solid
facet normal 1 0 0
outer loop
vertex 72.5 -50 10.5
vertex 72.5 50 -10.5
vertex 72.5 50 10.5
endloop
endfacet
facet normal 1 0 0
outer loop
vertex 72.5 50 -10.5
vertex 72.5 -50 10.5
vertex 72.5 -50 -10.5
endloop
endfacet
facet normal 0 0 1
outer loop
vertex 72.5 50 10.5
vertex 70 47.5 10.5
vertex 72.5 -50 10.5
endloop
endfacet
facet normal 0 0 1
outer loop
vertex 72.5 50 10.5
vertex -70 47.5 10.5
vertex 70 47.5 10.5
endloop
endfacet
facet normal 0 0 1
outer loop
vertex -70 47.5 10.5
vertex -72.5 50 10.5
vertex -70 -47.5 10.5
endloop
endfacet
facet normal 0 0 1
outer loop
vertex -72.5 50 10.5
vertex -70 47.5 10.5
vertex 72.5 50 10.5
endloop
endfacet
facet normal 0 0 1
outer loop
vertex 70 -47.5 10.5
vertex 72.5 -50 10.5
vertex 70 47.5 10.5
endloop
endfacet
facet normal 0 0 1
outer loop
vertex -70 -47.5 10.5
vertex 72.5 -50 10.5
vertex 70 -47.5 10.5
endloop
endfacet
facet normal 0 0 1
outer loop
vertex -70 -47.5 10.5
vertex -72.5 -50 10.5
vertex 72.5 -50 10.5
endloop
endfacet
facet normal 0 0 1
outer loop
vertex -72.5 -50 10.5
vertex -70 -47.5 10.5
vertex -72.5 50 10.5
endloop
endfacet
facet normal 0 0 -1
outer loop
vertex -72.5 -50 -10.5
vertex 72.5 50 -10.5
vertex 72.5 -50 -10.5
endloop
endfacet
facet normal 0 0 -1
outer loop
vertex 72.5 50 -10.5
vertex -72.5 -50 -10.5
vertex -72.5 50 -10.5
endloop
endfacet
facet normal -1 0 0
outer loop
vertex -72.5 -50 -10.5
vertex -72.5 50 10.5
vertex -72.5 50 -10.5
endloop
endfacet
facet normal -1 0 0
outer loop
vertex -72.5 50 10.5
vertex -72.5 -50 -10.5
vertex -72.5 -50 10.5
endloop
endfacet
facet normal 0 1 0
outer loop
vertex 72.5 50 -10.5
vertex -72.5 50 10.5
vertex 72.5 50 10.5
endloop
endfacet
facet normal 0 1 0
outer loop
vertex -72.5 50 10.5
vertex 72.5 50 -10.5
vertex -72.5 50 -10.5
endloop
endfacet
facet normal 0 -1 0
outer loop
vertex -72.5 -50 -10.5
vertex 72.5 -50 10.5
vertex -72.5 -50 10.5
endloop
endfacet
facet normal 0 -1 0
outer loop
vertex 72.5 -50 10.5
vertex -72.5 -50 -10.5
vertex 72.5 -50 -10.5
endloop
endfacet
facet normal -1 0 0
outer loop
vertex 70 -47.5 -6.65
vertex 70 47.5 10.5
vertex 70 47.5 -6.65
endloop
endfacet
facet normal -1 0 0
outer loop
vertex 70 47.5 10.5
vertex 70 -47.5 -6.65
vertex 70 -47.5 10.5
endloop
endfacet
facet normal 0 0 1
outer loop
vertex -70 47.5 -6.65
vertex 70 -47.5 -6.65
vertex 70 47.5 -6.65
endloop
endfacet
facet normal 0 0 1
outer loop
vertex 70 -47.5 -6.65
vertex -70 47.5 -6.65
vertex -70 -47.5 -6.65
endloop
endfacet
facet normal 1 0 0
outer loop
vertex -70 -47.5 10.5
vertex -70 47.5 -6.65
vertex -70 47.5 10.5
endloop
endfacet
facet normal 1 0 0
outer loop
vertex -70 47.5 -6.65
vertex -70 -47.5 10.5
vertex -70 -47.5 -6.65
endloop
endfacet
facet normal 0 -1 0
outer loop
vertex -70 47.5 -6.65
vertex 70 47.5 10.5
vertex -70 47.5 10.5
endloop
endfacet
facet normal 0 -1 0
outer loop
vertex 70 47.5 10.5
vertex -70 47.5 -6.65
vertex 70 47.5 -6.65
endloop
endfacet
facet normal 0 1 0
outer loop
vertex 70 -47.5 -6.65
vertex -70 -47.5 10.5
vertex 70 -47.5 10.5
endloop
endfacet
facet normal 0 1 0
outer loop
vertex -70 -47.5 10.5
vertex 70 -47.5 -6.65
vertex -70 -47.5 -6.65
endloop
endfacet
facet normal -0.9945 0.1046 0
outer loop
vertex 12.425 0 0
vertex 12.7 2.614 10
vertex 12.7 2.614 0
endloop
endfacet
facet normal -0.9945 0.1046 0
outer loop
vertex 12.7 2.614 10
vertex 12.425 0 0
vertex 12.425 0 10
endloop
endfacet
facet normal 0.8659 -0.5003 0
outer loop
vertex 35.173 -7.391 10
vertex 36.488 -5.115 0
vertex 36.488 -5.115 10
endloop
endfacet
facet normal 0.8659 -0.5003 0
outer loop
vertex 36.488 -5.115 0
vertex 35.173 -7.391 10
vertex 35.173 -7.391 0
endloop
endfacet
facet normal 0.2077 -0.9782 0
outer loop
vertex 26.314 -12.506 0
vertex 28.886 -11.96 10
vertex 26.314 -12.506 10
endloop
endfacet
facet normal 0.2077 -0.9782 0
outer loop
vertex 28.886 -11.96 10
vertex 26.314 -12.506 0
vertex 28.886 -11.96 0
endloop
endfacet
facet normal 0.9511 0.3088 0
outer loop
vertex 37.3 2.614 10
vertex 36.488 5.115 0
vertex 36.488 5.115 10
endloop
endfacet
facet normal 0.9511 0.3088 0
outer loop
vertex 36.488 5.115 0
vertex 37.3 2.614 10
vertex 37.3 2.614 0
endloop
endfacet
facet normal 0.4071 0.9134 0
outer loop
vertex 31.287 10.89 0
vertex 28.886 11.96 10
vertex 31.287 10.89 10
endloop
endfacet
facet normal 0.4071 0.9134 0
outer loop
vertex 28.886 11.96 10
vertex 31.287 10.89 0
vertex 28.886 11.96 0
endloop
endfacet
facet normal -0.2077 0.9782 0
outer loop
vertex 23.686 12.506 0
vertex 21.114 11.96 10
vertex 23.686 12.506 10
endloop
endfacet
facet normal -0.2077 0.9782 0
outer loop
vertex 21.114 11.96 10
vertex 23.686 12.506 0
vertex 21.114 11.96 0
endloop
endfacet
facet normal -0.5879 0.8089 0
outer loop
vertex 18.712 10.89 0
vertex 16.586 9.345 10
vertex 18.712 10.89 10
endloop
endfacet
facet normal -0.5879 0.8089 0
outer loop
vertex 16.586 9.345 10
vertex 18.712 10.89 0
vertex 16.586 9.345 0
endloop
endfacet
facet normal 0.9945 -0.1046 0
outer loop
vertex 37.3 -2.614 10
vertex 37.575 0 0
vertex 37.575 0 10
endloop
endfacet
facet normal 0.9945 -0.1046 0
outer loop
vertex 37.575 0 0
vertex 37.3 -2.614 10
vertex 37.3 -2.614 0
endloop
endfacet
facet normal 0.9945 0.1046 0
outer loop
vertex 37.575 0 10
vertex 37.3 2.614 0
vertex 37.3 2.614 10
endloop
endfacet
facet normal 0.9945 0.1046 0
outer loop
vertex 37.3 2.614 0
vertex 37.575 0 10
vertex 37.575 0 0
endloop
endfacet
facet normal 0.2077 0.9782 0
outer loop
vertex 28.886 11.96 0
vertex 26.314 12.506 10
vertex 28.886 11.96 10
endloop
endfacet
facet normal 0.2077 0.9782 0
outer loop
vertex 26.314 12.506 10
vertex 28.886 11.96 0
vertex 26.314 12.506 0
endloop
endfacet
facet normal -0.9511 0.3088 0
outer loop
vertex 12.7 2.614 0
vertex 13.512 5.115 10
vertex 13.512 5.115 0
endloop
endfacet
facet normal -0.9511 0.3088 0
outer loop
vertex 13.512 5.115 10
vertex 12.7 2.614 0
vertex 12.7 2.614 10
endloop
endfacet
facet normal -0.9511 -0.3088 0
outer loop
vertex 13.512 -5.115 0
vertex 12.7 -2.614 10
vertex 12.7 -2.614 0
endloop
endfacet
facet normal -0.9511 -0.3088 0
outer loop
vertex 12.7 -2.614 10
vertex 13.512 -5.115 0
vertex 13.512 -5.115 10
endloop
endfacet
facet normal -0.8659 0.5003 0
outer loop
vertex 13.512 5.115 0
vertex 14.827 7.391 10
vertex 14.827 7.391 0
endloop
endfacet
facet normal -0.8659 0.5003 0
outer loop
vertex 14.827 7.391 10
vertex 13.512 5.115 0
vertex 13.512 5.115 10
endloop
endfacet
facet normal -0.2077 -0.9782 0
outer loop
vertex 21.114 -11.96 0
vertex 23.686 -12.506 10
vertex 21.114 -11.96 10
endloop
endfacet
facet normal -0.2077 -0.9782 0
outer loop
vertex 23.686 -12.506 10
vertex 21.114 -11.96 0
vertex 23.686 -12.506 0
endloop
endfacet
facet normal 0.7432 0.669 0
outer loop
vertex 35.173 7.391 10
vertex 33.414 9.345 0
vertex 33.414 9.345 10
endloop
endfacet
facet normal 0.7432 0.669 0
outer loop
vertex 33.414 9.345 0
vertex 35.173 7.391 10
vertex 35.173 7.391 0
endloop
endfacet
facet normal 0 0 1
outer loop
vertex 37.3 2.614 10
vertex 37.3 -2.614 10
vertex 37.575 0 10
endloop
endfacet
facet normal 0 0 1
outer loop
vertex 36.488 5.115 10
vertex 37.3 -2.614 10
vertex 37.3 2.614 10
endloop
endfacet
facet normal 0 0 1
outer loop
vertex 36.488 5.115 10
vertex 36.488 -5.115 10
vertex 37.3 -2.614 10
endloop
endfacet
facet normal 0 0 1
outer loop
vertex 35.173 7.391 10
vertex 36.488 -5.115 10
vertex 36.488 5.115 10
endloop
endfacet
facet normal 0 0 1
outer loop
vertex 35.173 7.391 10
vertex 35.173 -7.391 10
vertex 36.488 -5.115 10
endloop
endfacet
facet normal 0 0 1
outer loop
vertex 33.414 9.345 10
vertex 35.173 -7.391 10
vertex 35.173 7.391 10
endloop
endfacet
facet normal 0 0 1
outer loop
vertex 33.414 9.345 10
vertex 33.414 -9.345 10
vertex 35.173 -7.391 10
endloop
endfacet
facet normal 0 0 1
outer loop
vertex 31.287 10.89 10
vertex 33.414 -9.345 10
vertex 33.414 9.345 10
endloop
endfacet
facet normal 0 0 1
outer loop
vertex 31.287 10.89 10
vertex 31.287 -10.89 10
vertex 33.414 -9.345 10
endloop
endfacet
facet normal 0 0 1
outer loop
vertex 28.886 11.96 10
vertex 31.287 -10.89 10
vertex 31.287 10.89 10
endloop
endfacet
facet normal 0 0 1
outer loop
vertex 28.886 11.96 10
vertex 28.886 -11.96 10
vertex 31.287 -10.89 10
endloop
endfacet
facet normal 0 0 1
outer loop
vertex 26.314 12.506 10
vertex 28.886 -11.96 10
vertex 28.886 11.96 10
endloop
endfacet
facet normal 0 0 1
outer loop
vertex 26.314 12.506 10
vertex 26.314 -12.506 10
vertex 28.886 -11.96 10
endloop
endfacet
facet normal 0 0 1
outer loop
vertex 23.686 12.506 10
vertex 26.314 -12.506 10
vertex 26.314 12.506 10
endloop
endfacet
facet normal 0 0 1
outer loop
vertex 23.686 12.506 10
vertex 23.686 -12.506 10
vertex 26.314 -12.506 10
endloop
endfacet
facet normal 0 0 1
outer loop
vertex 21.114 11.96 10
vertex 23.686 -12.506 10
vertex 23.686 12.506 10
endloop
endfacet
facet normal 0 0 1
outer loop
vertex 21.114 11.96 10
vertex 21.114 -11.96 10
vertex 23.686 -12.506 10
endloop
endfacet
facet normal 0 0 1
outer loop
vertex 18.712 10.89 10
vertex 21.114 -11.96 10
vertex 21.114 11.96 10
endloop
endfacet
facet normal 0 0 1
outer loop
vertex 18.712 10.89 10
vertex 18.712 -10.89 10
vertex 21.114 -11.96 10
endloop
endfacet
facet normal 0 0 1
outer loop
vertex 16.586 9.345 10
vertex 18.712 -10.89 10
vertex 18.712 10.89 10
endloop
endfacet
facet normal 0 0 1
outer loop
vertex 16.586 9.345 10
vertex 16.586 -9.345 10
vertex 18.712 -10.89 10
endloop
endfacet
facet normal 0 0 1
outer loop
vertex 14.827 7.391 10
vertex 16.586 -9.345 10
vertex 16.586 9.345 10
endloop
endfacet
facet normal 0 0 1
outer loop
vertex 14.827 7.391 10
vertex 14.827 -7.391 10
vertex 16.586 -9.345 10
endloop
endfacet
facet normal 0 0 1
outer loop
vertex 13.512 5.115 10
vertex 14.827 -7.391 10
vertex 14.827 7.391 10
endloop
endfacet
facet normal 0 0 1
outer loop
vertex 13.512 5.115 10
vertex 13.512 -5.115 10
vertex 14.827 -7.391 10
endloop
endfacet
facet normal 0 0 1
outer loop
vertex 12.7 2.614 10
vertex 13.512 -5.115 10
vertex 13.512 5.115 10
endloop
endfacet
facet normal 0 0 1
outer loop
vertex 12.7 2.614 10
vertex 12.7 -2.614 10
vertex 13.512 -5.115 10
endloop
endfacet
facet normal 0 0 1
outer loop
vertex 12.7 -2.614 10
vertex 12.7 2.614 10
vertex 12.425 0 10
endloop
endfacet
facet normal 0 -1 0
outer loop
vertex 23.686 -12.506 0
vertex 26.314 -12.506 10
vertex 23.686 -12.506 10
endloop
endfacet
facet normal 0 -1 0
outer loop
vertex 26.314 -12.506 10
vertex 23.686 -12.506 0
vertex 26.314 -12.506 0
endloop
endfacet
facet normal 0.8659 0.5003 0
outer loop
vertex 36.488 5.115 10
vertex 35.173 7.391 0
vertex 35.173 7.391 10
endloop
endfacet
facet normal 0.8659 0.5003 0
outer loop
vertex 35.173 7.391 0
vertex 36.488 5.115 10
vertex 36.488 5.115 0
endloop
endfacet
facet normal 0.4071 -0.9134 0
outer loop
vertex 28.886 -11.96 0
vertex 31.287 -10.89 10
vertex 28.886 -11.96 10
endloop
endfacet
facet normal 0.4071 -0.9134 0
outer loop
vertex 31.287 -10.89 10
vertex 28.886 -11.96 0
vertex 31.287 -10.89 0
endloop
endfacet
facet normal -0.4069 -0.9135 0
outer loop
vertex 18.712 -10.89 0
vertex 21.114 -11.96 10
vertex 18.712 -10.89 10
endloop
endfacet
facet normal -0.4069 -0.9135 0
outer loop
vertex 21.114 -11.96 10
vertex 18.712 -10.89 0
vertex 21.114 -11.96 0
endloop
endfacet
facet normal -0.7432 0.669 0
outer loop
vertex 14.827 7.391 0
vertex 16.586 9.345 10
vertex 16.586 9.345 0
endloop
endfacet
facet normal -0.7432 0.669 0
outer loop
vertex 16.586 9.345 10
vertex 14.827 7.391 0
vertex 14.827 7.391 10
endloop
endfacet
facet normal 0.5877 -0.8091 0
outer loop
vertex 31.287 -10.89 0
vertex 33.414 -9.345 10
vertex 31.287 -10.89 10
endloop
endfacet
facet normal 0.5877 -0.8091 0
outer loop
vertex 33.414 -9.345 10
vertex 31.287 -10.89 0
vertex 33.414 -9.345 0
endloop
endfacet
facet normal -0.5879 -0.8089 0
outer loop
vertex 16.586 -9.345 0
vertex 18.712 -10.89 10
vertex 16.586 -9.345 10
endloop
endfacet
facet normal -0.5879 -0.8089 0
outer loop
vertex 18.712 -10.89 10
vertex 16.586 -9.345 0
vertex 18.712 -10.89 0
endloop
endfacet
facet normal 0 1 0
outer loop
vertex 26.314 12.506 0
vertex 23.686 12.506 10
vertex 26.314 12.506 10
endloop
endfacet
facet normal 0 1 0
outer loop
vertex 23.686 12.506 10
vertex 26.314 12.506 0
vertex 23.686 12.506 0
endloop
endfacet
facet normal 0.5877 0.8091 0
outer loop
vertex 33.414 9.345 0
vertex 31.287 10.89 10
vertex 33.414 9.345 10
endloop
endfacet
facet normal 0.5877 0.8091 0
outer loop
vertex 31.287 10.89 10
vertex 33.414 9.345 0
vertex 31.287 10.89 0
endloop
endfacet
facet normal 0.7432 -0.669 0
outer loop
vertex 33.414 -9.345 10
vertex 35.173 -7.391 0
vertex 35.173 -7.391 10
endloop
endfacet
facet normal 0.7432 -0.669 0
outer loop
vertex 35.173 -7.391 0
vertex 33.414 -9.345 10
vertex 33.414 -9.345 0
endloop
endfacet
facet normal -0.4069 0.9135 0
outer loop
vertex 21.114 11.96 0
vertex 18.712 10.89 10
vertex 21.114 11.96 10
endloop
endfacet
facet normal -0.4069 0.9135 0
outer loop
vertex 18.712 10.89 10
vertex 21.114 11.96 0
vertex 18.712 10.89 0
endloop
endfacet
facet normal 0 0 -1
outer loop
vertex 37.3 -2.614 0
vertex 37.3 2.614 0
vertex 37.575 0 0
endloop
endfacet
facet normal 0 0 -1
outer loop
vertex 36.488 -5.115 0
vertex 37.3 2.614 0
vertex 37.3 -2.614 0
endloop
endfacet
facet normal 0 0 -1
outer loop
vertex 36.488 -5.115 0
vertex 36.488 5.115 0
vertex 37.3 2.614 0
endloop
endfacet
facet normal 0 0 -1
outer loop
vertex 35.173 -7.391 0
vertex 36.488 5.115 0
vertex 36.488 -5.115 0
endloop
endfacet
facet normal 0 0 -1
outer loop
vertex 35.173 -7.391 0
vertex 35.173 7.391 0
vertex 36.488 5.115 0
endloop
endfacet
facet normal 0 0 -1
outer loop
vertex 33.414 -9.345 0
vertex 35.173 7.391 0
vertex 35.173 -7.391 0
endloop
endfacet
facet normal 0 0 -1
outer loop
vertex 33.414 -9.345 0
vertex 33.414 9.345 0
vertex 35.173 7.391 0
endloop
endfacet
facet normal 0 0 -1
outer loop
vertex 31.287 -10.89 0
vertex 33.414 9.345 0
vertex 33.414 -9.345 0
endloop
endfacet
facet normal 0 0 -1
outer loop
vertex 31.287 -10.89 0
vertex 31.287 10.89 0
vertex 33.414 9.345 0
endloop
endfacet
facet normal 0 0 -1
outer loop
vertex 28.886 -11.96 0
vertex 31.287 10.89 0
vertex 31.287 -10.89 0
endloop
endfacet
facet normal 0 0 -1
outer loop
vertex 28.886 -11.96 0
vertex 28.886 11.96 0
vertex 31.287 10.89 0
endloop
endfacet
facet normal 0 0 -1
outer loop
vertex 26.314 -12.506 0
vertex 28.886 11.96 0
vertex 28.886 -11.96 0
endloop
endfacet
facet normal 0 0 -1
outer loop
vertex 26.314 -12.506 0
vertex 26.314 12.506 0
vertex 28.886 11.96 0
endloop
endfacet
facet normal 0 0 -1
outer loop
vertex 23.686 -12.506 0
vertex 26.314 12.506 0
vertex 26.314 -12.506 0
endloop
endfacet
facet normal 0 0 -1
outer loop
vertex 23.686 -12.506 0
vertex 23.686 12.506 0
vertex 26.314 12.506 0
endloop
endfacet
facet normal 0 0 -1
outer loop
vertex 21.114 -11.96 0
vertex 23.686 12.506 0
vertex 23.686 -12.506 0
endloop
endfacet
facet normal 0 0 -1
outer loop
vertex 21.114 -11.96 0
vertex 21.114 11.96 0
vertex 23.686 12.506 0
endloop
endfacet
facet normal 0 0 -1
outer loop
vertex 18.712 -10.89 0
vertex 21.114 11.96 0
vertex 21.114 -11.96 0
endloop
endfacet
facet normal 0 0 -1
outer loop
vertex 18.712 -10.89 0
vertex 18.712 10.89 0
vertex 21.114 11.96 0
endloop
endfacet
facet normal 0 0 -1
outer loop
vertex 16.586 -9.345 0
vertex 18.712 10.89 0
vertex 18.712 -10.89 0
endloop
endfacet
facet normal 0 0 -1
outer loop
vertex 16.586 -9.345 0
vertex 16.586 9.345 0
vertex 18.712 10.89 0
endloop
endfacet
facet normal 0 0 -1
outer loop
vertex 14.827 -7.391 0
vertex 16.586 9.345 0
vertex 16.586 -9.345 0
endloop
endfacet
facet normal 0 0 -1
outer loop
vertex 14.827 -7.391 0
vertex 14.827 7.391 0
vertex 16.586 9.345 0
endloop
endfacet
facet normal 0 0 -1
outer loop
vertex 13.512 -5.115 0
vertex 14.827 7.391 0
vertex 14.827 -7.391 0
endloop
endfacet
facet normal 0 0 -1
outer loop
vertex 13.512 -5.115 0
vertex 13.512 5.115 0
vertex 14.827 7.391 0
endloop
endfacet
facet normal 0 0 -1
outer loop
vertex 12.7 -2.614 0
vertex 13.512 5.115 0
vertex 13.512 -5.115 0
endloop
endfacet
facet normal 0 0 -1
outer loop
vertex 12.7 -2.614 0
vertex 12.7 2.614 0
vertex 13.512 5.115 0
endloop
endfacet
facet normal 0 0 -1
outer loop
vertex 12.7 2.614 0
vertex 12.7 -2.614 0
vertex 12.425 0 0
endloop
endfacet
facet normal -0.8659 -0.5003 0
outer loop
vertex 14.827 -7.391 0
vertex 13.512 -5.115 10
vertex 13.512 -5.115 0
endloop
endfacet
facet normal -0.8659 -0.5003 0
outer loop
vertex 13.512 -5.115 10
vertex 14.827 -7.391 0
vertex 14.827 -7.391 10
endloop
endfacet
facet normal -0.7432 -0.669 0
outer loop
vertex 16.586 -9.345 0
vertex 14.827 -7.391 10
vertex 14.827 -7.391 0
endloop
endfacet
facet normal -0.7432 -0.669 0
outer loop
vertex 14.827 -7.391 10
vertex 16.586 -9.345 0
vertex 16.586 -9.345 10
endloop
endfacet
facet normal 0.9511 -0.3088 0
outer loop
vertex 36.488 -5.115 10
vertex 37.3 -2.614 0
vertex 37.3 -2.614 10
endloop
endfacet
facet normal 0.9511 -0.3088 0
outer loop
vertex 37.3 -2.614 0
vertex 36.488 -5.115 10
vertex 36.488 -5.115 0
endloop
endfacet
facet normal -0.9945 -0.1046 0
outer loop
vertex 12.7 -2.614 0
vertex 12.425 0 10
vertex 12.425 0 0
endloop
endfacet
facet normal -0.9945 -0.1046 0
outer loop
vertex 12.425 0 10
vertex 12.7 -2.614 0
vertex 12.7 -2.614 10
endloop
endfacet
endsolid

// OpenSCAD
// file: 3dprinter.scad
//BioDeploy SCAD file = 3dprinter.scad


//choose the max specs for your 3d printer
//here we use a replicator2x specs

x_print_max = 25*10;
y_print_max = 15.2*10;
z_print_max = 15.5*10;

//don't forget *10 to put in centimeters
// file: generator_variables.scad
//===============================================//
//===============================================//
// BioDeploy SCAD file = generator_variables.scad//
//                 Start File                    //
//===============================================//
//===============================================//
//-----------------------------------------------//
include <3dprinter.scad>
//===============================================//
//                   variables                   //
//===============================================//
//===============================================//
pad = 0.1; //padding
//choose the spec for your generator
//===============================================//
//                    magnets1                   //
//===============================================//
//Volume :
x_magnet = 5.5;
y_magnet = 21.5;
z_magnet = 21.5;
//Number of magnets on the rotor :
nbmagnetsonrotor = 16;
rotor_ext_max = 60;
//===============================================//
//                    magnets2                   //
//===============================================//
//Volume :
diam_magnet2 = 35;
z_magnet2 = 5;
//Number of magnets on the rotor :
nbmagnetsonrotor2 = 6;
//===============================================//
//                      rotor                    //
//===============================================//
smooth_rotor = 100;
smooth_bobine = 100;
z_rotor_int = 20;
//===============================================//
//                  adapter_rotor                //
//===============================================//
diam_adapter_max = 32 ;
diam_adapter_min = 25.15 ;
h_adapter = 7;
h_adapter_box = 12;
nbarm = 6;
//===============================================//
//                    Bobine1                    //
//===============================================//
r_bobine_ext_max = y_magnet/2;
r_bobine_ext_min = 4.5;
r_bobine_int = 3.5;

x_bobine = 30;
p_bobine_ext = 1;

r_bobine2_ext_min = 3.4;
r_bobine2_int = 2.5;

wire_in = 1;
wire_out = 1;


//===============================================//
//                    Protector                  //
//===============================================//

r_bobine_protector_ext_max = y_magnet/2 + 1.5;
gap_bobine_protector = (r_bobine_protector_ext_max - r_bobine_ext_max)/2;


x_bobine_protector=x_bobine+1.5;

smooth_protector = 100;

//===============================================//
//                    Socle1                     //
//===============================================//

r_socle_int = 0;
r_socle_ext = 0;
position_bobine_in = 0;
position_bobine_out = 0;
connector_socle_female =0;
connector_socle_male =0;
space_marge=3;

//-----------------------------------------------//
//===============================================//
//===============================================//
// BioDeploy SCAD file = generator_variables.scad//
//                   End  File                   //
//===============================================//
//===============================================//
// main file
//===============================================//
//===============================================//
//    BioDeploy SCAD file = generator_hdd.scad   //
//                 Start File                    //
//===============================================//
//===============================================//
//-----------------------------------------------//

//===============================================//
//                   variables                   //
//===============================================//
include <generator_variables.scad>
//===============================================//
//               Calls for use                   //
//===============================================//
//use <generator_logo.scad>
//===============================================//
//                    Trees                      //
//===============================================//

module hdd_pre() {
difference() {
color("Gray",1)cube([145,100,21],center=true);
translate([0,0,2.5+pad])cube([140,95,18.5],center=true);}
}

module hdd() {
union(){
hdd_pre();
translate([(145-95)/2,0,+5])color("Gray",1)cylinder(10,diam_adapter_min/2,diam_adapter_min/2, center=true);}}

hdd();


//-----------------------------------------------//
//===============================================//
//===============================================//
//    BioDeploy SCAD file = generator_hdd.scad   //
//                   End  File                   //
//===============================================//
//===============================================//
